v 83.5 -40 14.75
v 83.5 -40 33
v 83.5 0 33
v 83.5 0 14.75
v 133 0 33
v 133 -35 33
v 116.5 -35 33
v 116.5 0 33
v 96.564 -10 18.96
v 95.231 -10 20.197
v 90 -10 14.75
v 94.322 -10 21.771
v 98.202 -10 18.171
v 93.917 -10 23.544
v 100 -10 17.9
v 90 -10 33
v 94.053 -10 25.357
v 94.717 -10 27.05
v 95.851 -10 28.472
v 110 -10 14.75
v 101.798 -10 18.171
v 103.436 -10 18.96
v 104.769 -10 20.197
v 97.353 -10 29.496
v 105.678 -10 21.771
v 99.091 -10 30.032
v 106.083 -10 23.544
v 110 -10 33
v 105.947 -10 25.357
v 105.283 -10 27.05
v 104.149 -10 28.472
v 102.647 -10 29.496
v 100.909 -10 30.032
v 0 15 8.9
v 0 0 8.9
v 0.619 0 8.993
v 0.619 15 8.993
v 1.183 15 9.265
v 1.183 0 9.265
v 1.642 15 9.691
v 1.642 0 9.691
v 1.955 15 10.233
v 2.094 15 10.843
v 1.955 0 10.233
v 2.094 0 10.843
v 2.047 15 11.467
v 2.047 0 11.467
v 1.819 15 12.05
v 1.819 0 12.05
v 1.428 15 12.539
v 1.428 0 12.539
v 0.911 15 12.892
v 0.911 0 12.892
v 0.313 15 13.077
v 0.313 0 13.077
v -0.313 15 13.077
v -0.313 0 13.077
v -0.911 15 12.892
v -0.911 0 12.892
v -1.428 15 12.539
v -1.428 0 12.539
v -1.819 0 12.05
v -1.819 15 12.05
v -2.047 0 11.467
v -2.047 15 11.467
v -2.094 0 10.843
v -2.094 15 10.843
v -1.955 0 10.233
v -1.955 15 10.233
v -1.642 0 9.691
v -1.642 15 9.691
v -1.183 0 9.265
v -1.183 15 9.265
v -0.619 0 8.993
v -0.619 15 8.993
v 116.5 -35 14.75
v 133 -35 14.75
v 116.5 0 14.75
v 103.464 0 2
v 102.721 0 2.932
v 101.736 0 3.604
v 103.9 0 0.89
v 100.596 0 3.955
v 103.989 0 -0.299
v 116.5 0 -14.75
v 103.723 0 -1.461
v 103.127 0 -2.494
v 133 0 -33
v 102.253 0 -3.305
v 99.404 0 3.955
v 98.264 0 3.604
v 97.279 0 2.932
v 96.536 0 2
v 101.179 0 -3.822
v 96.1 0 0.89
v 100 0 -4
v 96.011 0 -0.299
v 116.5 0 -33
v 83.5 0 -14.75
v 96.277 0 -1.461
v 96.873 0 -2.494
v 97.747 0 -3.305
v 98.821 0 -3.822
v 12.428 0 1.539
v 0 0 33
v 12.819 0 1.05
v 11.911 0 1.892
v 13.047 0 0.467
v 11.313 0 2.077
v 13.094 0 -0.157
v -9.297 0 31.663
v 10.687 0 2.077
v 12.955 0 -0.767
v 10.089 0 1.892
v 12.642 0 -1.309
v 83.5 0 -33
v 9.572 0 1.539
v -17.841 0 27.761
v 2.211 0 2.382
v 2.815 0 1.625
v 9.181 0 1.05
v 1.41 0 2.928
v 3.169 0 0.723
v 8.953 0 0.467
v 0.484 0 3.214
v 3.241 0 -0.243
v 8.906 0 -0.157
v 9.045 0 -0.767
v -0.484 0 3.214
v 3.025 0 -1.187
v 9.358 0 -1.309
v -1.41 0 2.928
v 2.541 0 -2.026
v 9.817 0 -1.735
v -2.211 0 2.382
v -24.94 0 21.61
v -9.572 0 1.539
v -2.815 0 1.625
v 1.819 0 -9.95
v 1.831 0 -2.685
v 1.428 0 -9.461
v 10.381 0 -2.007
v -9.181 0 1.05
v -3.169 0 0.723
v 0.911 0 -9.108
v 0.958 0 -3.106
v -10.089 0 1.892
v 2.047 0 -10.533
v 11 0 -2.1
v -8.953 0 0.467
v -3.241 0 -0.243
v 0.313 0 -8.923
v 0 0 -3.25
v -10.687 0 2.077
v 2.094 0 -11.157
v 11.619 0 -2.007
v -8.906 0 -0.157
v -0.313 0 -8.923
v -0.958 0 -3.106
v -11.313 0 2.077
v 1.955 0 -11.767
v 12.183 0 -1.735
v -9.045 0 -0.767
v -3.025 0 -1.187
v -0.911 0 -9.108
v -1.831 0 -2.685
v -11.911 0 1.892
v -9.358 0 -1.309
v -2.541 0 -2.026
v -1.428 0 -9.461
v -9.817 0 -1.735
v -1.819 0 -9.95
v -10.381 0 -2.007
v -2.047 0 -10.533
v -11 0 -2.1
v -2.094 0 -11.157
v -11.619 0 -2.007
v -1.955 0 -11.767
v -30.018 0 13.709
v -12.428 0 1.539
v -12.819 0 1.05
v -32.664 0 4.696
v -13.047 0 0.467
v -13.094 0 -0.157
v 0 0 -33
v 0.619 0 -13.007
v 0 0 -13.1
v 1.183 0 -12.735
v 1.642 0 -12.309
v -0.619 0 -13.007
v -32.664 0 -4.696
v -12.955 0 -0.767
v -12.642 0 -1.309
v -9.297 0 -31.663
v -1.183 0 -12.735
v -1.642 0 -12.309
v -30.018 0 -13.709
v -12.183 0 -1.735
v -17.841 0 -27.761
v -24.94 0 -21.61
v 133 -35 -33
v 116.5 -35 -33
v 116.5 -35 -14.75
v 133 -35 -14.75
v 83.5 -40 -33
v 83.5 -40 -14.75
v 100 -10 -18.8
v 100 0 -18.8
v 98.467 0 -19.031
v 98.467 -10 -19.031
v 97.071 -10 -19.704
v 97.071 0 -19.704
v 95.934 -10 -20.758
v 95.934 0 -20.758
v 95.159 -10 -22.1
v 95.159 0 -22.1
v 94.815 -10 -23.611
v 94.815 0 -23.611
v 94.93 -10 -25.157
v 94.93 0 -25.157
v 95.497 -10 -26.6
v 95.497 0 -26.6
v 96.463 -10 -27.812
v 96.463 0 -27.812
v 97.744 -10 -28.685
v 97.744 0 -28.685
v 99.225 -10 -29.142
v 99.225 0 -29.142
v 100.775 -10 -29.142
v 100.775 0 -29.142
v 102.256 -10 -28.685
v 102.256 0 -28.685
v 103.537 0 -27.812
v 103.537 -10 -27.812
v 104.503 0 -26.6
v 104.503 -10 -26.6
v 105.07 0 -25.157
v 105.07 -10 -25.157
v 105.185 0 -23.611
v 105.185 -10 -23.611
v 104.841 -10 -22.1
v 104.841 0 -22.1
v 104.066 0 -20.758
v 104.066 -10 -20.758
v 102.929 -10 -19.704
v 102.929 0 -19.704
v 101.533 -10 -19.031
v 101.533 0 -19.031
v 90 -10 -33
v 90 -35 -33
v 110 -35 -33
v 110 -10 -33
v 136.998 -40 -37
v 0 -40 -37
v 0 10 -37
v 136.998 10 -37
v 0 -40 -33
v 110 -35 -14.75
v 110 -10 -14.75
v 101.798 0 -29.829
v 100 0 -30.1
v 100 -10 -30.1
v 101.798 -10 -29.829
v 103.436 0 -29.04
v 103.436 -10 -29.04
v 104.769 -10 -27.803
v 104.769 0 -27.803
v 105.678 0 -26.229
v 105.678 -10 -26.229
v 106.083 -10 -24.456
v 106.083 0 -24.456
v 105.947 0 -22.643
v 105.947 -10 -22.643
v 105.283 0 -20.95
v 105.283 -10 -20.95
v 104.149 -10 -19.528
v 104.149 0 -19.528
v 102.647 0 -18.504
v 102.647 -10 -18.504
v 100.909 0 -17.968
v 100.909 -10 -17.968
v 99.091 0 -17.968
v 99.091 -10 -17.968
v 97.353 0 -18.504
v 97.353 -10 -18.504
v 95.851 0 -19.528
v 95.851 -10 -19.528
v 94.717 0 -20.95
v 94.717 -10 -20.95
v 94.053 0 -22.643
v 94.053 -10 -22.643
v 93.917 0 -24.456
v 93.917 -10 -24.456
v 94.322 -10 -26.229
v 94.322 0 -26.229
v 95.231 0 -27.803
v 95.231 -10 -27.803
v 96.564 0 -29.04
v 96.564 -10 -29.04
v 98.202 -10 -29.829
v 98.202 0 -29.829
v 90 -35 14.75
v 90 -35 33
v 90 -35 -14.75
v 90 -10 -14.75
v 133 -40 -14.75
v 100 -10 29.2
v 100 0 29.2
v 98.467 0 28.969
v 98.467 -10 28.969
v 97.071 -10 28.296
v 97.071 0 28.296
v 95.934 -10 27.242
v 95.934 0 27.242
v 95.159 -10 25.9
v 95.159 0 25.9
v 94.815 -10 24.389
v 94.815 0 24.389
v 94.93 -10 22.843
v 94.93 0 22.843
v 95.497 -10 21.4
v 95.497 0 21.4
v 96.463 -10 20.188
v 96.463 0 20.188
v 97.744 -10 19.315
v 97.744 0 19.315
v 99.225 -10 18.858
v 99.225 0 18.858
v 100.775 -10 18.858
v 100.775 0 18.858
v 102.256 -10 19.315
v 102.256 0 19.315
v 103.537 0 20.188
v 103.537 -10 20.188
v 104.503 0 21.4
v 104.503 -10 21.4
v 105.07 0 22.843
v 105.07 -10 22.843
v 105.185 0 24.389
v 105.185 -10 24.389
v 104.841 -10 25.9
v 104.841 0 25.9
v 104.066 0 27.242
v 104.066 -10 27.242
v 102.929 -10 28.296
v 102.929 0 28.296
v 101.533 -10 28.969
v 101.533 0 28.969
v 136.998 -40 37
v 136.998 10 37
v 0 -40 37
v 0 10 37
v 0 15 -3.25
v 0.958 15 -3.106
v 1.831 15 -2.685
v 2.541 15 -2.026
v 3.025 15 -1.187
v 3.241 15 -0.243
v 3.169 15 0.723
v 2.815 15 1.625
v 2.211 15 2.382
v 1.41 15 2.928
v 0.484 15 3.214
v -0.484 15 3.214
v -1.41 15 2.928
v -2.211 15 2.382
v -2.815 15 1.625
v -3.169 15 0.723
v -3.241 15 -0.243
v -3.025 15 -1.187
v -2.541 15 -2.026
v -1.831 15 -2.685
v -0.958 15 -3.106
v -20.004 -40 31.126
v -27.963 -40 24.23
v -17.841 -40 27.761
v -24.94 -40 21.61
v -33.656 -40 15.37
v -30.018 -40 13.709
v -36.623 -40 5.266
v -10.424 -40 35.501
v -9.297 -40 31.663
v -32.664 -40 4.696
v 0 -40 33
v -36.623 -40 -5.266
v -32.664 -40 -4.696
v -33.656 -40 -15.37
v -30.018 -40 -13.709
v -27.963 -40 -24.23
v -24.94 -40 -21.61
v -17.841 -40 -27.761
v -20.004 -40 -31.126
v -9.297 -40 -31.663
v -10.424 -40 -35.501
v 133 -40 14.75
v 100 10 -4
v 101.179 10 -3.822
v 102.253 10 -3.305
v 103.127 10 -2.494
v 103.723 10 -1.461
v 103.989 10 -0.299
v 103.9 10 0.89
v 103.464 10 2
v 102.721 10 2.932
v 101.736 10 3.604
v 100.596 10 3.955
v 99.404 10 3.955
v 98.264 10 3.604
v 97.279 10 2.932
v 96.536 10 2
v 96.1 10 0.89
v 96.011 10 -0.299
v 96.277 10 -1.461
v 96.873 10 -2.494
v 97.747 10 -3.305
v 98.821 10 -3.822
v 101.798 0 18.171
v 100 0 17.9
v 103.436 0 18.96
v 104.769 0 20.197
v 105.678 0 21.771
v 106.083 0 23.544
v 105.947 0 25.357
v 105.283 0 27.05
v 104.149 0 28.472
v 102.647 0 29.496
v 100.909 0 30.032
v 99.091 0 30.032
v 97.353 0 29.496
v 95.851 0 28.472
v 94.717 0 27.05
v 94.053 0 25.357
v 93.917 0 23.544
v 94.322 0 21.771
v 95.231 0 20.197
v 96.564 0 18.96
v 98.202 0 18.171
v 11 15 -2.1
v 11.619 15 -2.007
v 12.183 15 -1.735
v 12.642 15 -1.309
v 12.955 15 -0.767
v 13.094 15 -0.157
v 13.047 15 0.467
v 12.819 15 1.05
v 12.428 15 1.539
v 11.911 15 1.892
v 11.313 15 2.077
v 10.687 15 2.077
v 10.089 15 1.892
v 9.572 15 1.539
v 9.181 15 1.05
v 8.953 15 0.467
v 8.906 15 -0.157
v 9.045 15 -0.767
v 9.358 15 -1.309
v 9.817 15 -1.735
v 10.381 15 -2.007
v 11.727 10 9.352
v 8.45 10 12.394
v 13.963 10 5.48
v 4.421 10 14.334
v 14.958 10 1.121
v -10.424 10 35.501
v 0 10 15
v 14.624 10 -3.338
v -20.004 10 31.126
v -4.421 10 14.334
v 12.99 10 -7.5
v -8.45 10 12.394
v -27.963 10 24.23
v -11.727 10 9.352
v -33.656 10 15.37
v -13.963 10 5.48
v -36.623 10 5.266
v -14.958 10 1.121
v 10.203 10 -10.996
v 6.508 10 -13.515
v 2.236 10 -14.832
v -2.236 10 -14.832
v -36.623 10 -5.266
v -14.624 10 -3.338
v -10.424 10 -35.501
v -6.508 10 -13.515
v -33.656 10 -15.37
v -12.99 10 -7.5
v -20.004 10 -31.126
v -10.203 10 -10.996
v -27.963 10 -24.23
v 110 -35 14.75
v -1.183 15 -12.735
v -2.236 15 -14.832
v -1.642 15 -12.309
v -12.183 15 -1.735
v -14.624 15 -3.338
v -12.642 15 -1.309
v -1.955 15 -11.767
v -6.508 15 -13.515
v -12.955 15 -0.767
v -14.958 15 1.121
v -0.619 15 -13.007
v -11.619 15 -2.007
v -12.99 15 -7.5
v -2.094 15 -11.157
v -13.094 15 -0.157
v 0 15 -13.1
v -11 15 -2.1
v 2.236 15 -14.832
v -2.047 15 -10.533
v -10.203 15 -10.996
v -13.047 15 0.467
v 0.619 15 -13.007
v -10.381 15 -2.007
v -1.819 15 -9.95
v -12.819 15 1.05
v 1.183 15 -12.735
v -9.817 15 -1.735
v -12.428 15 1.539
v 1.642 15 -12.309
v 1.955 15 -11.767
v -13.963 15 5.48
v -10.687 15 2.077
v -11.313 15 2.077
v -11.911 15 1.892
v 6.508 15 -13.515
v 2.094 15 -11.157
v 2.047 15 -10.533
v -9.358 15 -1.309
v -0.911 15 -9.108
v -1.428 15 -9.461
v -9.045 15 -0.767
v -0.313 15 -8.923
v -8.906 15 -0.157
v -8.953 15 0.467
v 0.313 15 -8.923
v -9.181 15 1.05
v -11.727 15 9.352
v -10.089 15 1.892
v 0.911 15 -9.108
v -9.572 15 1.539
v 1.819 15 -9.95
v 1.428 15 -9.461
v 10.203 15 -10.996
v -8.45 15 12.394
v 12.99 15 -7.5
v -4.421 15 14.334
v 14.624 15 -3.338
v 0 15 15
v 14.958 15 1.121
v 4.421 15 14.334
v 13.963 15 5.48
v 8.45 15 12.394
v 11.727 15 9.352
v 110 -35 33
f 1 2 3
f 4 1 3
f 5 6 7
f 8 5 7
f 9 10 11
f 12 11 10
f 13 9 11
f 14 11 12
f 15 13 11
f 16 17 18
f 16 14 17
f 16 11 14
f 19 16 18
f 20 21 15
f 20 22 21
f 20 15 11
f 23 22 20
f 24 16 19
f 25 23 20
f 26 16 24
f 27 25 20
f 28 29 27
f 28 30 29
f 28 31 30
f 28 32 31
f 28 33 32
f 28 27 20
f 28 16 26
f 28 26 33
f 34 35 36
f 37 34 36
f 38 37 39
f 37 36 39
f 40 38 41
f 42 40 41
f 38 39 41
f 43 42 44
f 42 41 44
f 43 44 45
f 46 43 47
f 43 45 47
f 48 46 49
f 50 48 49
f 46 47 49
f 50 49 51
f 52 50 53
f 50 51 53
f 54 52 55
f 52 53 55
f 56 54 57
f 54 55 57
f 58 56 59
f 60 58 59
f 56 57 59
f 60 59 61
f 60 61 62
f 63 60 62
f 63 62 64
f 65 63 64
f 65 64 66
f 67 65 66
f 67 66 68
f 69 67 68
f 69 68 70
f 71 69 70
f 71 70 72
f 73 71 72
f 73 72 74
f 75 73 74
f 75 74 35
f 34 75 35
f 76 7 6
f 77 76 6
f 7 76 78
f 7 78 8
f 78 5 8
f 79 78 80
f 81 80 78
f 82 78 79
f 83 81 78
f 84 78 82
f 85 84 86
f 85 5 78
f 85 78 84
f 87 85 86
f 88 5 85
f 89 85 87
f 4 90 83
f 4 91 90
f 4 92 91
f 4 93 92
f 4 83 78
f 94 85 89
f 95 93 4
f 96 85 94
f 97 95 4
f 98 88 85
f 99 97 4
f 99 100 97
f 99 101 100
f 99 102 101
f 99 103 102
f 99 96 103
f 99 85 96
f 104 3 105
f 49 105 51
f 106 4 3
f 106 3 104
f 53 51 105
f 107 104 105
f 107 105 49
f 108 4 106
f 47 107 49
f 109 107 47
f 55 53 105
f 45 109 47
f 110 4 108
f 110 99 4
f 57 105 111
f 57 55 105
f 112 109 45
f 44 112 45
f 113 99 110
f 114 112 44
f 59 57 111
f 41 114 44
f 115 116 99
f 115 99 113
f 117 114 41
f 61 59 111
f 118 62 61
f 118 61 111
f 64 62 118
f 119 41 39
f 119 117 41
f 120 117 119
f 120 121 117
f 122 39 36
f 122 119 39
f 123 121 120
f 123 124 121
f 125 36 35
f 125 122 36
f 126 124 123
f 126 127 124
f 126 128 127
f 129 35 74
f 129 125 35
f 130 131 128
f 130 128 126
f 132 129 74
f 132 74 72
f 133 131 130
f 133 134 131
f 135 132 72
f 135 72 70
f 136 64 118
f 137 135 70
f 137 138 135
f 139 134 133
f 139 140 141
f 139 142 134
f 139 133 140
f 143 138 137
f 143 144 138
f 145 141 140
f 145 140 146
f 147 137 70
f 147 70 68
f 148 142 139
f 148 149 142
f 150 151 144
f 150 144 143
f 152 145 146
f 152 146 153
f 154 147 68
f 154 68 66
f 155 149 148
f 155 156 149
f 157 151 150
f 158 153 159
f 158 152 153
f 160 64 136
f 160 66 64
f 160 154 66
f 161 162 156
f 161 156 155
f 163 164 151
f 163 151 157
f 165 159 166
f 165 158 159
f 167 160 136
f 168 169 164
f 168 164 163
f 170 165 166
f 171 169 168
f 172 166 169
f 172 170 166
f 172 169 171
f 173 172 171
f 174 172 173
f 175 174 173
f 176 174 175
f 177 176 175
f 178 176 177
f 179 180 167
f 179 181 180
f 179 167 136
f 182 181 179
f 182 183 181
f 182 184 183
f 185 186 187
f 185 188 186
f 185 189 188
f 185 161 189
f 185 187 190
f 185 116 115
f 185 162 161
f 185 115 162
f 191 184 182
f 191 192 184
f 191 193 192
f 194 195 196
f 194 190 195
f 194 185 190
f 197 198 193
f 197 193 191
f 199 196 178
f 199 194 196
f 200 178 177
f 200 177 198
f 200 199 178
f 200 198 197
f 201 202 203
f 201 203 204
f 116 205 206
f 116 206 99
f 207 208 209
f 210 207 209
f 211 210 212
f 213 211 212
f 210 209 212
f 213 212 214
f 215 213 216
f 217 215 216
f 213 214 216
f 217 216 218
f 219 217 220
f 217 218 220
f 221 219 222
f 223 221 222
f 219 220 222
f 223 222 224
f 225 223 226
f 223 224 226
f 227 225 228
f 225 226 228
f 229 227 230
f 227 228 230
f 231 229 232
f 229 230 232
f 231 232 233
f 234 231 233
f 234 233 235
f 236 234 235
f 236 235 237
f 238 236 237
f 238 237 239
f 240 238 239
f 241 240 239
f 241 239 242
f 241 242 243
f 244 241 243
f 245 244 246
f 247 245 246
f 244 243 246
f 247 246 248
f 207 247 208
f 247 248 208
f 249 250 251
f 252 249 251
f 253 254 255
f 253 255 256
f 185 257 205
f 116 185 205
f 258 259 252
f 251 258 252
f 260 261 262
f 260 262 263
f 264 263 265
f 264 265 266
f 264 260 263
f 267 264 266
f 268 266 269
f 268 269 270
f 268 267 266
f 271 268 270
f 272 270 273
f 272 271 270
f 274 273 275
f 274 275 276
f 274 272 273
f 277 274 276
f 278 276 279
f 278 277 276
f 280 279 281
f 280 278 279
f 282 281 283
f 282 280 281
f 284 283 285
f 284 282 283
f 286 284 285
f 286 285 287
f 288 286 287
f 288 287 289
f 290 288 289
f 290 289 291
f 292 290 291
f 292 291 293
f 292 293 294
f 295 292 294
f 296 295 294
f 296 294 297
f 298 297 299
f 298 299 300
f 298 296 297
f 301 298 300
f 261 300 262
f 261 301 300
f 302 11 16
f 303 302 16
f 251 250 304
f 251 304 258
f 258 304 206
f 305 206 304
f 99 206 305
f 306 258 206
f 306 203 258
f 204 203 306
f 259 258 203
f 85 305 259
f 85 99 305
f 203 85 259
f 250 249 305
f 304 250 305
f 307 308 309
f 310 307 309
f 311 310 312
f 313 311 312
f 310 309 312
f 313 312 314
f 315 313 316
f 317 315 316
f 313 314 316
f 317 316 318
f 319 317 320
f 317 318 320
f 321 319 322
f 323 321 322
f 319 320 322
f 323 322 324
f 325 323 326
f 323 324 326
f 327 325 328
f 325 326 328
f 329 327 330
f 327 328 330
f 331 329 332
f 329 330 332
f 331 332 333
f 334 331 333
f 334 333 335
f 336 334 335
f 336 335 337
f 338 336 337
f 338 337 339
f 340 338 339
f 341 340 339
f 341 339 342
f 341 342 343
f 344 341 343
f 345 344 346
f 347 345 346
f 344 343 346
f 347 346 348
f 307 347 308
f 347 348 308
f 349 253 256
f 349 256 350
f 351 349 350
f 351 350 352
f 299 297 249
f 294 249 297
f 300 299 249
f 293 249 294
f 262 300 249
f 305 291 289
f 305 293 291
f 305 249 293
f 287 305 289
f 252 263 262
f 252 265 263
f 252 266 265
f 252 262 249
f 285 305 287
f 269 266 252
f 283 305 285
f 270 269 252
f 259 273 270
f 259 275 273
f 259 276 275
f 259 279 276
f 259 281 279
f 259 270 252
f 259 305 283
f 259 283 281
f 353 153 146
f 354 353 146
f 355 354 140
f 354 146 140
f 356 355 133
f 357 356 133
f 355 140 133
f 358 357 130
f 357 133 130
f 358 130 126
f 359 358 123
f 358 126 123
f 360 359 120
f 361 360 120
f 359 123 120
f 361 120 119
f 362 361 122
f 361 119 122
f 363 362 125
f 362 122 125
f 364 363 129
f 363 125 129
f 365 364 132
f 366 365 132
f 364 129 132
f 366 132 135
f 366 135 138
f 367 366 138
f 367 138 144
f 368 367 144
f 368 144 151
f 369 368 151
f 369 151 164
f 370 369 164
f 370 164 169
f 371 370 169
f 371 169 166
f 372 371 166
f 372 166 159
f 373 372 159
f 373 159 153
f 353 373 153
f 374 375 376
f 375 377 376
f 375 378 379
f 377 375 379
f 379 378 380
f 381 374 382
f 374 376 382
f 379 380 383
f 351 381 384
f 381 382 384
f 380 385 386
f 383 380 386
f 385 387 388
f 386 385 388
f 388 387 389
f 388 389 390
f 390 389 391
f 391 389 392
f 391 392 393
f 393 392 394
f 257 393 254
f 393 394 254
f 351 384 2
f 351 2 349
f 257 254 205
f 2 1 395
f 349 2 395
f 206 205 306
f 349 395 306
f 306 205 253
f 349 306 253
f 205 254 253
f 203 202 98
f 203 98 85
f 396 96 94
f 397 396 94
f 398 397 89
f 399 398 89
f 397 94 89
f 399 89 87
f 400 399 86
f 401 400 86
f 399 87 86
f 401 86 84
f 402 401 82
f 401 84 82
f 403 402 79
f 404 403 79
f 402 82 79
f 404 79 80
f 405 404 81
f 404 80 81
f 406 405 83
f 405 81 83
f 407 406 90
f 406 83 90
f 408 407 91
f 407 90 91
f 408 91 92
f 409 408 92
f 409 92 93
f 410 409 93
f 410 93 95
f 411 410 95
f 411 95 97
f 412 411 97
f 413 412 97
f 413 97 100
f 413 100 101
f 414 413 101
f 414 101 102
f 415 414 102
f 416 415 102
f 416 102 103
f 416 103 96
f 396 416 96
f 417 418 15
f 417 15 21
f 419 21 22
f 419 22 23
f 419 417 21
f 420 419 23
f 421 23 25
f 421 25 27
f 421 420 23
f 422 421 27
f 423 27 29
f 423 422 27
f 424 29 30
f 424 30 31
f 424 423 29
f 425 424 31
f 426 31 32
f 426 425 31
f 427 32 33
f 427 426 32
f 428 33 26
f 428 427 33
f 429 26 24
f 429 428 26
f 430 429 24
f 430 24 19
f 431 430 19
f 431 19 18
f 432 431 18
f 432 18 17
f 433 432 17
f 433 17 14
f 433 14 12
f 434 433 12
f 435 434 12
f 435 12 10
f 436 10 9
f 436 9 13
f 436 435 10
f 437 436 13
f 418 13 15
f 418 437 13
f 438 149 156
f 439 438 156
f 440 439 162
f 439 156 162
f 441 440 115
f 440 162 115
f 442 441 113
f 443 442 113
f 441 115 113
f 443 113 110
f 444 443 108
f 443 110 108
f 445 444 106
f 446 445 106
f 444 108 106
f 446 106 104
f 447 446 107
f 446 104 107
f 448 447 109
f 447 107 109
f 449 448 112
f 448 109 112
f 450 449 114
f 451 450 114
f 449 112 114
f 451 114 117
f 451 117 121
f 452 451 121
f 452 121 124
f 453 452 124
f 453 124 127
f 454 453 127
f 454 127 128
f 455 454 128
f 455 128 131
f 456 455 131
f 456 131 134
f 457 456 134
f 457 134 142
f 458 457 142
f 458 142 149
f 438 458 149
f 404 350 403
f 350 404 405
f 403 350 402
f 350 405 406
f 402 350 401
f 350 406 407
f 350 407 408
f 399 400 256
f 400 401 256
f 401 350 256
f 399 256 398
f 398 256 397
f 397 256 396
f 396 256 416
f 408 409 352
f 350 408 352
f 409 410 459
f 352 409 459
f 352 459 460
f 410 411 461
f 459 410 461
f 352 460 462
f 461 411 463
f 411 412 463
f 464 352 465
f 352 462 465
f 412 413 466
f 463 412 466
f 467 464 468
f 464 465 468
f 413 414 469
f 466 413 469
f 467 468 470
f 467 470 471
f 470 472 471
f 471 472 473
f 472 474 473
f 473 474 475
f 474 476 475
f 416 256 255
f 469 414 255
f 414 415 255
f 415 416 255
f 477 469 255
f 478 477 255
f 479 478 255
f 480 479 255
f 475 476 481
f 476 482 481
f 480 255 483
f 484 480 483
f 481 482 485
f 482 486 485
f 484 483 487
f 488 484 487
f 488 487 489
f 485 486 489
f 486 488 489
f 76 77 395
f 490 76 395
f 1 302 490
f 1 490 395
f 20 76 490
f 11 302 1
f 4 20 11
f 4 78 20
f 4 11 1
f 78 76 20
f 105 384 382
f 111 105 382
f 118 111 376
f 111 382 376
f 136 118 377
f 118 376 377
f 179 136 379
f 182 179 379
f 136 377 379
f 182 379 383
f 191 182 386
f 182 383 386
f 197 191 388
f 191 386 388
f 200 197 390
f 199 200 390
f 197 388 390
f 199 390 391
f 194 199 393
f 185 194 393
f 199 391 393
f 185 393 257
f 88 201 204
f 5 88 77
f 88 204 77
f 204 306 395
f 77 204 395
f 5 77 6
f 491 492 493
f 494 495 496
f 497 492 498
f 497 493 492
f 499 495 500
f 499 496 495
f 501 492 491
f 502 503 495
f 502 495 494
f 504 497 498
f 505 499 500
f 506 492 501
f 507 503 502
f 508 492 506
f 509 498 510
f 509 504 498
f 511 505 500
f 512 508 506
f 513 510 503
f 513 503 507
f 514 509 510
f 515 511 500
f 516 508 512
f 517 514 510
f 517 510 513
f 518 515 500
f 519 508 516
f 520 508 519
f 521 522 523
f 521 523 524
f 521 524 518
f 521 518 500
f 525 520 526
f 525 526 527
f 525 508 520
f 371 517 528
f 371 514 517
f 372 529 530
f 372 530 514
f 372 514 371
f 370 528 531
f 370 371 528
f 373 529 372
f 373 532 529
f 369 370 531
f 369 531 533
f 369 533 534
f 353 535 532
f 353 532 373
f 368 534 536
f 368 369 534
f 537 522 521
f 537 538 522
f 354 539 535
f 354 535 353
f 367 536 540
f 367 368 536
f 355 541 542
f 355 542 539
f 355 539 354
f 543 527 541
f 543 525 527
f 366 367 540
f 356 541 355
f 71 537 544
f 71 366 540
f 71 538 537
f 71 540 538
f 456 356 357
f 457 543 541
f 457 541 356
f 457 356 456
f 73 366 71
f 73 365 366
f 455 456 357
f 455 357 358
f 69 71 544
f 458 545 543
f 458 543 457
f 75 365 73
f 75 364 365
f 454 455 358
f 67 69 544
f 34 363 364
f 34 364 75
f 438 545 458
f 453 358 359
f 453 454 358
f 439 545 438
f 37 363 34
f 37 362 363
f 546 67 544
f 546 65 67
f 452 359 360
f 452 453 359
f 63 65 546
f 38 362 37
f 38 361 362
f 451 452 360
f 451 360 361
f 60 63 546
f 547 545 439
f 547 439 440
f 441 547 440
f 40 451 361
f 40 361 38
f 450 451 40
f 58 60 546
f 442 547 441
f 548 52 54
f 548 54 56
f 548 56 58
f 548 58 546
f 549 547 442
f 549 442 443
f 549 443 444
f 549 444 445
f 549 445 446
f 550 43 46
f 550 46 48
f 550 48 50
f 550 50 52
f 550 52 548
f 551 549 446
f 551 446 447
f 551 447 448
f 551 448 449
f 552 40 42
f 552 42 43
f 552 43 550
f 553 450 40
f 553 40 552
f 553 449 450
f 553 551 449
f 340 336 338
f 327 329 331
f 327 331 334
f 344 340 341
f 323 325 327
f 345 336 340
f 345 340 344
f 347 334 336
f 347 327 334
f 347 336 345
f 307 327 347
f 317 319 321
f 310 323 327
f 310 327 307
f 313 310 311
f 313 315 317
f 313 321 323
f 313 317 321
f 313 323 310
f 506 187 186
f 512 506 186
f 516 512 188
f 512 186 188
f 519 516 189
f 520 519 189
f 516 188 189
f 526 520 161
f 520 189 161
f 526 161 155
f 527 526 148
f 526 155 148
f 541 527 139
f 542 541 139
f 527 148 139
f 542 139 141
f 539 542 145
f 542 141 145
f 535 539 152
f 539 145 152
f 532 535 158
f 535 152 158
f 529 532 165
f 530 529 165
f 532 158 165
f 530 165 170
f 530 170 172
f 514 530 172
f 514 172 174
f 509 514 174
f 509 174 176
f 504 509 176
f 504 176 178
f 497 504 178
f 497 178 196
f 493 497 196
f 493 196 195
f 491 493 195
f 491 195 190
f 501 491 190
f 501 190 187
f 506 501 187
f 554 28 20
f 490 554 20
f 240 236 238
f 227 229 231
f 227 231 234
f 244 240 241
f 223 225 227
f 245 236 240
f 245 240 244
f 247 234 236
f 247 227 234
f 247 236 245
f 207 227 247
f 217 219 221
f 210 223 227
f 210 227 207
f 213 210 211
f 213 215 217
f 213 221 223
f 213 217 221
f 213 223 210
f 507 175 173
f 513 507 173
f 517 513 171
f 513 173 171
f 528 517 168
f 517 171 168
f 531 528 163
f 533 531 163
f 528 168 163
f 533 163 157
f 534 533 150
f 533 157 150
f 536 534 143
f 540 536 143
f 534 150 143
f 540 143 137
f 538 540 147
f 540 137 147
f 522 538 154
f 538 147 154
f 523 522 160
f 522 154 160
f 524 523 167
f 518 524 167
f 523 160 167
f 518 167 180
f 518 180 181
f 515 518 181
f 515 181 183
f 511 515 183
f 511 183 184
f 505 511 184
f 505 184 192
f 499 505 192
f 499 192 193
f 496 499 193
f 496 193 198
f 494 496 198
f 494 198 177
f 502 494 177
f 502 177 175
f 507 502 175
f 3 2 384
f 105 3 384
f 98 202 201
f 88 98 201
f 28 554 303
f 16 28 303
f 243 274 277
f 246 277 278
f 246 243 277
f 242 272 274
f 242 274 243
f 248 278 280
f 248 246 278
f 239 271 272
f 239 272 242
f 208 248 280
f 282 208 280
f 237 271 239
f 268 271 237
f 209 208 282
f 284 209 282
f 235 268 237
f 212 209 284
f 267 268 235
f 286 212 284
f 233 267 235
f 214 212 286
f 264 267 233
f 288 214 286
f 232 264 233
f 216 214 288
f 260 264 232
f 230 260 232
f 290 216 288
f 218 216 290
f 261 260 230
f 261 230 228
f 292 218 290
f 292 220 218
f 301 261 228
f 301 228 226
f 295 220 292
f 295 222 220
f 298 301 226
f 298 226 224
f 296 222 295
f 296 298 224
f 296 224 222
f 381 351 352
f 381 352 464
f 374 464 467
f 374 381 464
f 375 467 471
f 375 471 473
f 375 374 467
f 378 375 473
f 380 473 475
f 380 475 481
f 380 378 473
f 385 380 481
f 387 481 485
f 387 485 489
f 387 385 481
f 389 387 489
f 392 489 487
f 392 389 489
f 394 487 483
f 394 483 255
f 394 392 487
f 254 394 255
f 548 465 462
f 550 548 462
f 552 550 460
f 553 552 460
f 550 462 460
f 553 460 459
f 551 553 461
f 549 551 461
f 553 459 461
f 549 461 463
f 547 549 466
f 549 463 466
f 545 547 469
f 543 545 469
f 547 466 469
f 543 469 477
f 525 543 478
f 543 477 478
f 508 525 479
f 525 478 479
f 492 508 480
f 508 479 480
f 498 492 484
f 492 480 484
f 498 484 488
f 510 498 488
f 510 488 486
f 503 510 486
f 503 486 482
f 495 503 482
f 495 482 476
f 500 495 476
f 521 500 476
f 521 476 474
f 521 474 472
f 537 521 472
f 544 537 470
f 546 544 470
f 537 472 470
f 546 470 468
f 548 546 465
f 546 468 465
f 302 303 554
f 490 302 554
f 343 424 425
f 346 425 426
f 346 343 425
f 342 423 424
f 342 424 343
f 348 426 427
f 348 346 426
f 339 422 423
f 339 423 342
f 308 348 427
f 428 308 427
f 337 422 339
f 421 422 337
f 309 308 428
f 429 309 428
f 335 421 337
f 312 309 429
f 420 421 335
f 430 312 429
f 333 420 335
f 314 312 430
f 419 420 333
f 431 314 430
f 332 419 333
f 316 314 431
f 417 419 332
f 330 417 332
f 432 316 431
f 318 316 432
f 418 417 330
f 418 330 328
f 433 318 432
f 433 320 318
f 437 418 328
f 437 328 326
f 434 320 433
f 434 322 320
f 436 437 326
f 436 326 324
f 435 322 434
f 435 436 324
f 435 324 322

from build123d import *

# Parameters (mm, degrees)
BOSS_EXTRUDE3_DEPTH  = 10
SKETCH4_R            = 15
BOSS_EXTRUDE4_DEPTH  = 5
BOSS_EXTRUDE5_START  = 40
BOSS_EXTRUDE5_DEPTH  = 40
SKETCH8_R            = 6.1
BOSS_EXTRUDE10_DEPTH = 10
BOSS_EXTRUDE12_DEPTH = 25.25
BOSS_EXTRUDE13_DEPTH = 18.25
SKETCH13_W           = 49.5
SKETCH13_H           = 5
BOSS_EXTRUDE14_DEPTH = 18.25
SKETCH5_R            = 2.1
SKETCH5_R_2          = 3.25
SKETCH5_R_3          = 4
CUT_EXTRUDE5_DEPTH   = 18.25
SKETCH14_R           = 5.2
BOSS_EXTRUDE15_DEPTH = 10


with BuildPart() as part:
    # Sketch1 → Boss-Extrude3 (new body)
    with BuildSketch(Plane(origin=(0, 0, 0), x_dir=(1, 0, 0), z_dir=(0, 1, 0))):
        with BuildLine():
            Line((0, 37), (100, 37))
            Line((100, 37), (136.997861734, 37))
            Line((136.997861734, 37), (136.997861734, -37))
            Line((136.997861734, -37), (100, -37))
            Line((100, -37), (0, -37))
            ThreePointArc((0, -37), (-37, 0), (0, 37))
        make_face()
    extrude(amount=BOSS_EXTRUDE3_DEPTH)

    # Sketch4 → Boss-Extrude4 (add)
    with BuildSketch(Plane(origin=(0, 10, 0), x_dir=(1, 0, 0), z_dir=(0, 1, 0))):
        with Locations(Location((0, 0, 0), (0, 0, 270))):
            Circle(SKETCH4_R)
    extrude(amount=BOSS_EXTRUDE4_DEPTH)

    # Sketch7 → Boss-Extrude5 (add)
    with BuildSketch(Plane.XZ.offset(BOSS_EXTRUDE5_START)):
        with BuildLine():
            Line((0, -37), (136.997861734, -37))
            Line((136.997861734, -37), (136.997861734, 37))
            Line((136.997861734, 37), (0, 37))
            ThreePointArc((0, 37), (-37, 0), (0, -37))
        make_face()
        with BuildLine():
            ThreePointArc((0, 33), (-33, 0), (0, -33))
            Line((0, -33), (133, -33))
            Line((133, -33), (133, 33))
            Line((133, 33), (0, 33))
        make_face(mode=Mode.SUBTRACT)
    extrude(amount=-BOSS_EXTRUDE5_DEPTH)

    # Sketch8 → Boss-Extrude10 (add)
    # profile 1 of 2: a face of its own
    with BuildSketch(Plane.XZ):
        Polygon((83.5, 33), (83.5, 24), (83.5, 14.75), (100, 14.75), (116.5, 14.75), (116.5, 33), align=None)
        with Locations(Location((100, 24, 0), (0, 0, 270))):
            Circle(SKETCH8_R, mode=Mode.SUBTRACT)
    # profile 2 of 2: a face of its own
    with BuildSketch(Plane.XZ):
        Polygon((83.5, -14.75), (83.5, -30.5), (83.5, -33), (116.5, -33), (116.5, -30.5), (116.5, -14.75), (100, -14.75), align=None)
        with Locations(Location((100, -24, 0), (0, 0, 270))):
            Circle(SKETCH8_R, mode=Mode.SUBTRACT)
    extrude(amount=BOSS_EXTRUDE10_DEPTH)

    # Sketch12 → Boss-Extrude12 (add)
    with BuildSketch(Plane.XZ.offset(10)):
        Polygon((90, 14.75), (90, 24), (90, 33), (83.5, 33), (83.5, 14.75), align=None)
        Polygon((116.5, 33), (110, 33), (110, 24), (110, 14.75), (116.5, 14.75), align=None)
        Polygon((110, -14.75), (110, -24), (110, -33), (116.5, -33), (116.5, -14.75), align=None)
        Polygon((90, -24), (90, -14.75), (83.5, -14.75), (83.5, -33), (90, -33), align=None)
    extrude(amount=BOSS_EXTRUDE12_DEPTH)

    # Sketch9 → Boss-Extrude13 (add)
    with BuildSketch(Plane(origin=(0, 0, 33), x_dir=(-1, 0, 0), z_dir=(0, 0, -1))):
        Polygon((-133, -35), (-133, -40), (-83.5, -40), (-83.5, -35.25), (-90, -35.25), (-90, -35), (-110, -35), (-110, -35.25), (-116.5, -35.25), (-116.5, -35), align=None)
    extrude(amount=BOSS_EXTRUDE13_DEPTH)

    # Sketch13 → Boss-Extrude14 (add)
    with BuildSketch(Plane.XY.offset(-33)):
        with Locations((108.25, -37.5)):
            Rectangle(SKETCH13_W, SKETCH13_H)
    extrude(amount=BOSS_EXTRUDE14_DEPTH)

    # Sketch5 → Cut-Extrude5 (cut)
    with BuildSketch(Plane.XZ):
        with Locations(Location((-11, 0, 0), (0, 0, 270))):
            Circle(SKETCH5_R)
        with Locations(Location((0, 0, 0), (0, 0, 270))):
            Circle(SKETCH5_R_2)
        with Locations(Location((0, 11, 0), (0, 0, 270))):
            Circle(SKETCH5_R)
        with Locations(Location((11, 0, 0), (0, 0, 270))):
            Circle(SKETCH5_R)
        with Locations(Location((0, -11, 0), (0, 0, 270))):
            Circle(SKETCH5_R)
        with Locations(Location((100, 0, 0), (0, 0, 270))):
            Circle(SKETCH5_R_3)
    extrude(amount=-CUT_EXTRUDE5_DEPTH, mode=Mode.SUBTRACT)

    # Sketch14 → Boss-Extrude15 (add)
    with BuildSketch(Plane.XZ):
        with Locations(Location((100, 24, 0), (0, 0, 90))):
            Circle(SKETCH14_R)
        with Locations(Location((100, -24, 0), (0, 0, 90))):
            Circle(SKETCH14_R)
    extrude(amount=BOSS_EXTRUDE15_DEPTH)


solid = part.part
